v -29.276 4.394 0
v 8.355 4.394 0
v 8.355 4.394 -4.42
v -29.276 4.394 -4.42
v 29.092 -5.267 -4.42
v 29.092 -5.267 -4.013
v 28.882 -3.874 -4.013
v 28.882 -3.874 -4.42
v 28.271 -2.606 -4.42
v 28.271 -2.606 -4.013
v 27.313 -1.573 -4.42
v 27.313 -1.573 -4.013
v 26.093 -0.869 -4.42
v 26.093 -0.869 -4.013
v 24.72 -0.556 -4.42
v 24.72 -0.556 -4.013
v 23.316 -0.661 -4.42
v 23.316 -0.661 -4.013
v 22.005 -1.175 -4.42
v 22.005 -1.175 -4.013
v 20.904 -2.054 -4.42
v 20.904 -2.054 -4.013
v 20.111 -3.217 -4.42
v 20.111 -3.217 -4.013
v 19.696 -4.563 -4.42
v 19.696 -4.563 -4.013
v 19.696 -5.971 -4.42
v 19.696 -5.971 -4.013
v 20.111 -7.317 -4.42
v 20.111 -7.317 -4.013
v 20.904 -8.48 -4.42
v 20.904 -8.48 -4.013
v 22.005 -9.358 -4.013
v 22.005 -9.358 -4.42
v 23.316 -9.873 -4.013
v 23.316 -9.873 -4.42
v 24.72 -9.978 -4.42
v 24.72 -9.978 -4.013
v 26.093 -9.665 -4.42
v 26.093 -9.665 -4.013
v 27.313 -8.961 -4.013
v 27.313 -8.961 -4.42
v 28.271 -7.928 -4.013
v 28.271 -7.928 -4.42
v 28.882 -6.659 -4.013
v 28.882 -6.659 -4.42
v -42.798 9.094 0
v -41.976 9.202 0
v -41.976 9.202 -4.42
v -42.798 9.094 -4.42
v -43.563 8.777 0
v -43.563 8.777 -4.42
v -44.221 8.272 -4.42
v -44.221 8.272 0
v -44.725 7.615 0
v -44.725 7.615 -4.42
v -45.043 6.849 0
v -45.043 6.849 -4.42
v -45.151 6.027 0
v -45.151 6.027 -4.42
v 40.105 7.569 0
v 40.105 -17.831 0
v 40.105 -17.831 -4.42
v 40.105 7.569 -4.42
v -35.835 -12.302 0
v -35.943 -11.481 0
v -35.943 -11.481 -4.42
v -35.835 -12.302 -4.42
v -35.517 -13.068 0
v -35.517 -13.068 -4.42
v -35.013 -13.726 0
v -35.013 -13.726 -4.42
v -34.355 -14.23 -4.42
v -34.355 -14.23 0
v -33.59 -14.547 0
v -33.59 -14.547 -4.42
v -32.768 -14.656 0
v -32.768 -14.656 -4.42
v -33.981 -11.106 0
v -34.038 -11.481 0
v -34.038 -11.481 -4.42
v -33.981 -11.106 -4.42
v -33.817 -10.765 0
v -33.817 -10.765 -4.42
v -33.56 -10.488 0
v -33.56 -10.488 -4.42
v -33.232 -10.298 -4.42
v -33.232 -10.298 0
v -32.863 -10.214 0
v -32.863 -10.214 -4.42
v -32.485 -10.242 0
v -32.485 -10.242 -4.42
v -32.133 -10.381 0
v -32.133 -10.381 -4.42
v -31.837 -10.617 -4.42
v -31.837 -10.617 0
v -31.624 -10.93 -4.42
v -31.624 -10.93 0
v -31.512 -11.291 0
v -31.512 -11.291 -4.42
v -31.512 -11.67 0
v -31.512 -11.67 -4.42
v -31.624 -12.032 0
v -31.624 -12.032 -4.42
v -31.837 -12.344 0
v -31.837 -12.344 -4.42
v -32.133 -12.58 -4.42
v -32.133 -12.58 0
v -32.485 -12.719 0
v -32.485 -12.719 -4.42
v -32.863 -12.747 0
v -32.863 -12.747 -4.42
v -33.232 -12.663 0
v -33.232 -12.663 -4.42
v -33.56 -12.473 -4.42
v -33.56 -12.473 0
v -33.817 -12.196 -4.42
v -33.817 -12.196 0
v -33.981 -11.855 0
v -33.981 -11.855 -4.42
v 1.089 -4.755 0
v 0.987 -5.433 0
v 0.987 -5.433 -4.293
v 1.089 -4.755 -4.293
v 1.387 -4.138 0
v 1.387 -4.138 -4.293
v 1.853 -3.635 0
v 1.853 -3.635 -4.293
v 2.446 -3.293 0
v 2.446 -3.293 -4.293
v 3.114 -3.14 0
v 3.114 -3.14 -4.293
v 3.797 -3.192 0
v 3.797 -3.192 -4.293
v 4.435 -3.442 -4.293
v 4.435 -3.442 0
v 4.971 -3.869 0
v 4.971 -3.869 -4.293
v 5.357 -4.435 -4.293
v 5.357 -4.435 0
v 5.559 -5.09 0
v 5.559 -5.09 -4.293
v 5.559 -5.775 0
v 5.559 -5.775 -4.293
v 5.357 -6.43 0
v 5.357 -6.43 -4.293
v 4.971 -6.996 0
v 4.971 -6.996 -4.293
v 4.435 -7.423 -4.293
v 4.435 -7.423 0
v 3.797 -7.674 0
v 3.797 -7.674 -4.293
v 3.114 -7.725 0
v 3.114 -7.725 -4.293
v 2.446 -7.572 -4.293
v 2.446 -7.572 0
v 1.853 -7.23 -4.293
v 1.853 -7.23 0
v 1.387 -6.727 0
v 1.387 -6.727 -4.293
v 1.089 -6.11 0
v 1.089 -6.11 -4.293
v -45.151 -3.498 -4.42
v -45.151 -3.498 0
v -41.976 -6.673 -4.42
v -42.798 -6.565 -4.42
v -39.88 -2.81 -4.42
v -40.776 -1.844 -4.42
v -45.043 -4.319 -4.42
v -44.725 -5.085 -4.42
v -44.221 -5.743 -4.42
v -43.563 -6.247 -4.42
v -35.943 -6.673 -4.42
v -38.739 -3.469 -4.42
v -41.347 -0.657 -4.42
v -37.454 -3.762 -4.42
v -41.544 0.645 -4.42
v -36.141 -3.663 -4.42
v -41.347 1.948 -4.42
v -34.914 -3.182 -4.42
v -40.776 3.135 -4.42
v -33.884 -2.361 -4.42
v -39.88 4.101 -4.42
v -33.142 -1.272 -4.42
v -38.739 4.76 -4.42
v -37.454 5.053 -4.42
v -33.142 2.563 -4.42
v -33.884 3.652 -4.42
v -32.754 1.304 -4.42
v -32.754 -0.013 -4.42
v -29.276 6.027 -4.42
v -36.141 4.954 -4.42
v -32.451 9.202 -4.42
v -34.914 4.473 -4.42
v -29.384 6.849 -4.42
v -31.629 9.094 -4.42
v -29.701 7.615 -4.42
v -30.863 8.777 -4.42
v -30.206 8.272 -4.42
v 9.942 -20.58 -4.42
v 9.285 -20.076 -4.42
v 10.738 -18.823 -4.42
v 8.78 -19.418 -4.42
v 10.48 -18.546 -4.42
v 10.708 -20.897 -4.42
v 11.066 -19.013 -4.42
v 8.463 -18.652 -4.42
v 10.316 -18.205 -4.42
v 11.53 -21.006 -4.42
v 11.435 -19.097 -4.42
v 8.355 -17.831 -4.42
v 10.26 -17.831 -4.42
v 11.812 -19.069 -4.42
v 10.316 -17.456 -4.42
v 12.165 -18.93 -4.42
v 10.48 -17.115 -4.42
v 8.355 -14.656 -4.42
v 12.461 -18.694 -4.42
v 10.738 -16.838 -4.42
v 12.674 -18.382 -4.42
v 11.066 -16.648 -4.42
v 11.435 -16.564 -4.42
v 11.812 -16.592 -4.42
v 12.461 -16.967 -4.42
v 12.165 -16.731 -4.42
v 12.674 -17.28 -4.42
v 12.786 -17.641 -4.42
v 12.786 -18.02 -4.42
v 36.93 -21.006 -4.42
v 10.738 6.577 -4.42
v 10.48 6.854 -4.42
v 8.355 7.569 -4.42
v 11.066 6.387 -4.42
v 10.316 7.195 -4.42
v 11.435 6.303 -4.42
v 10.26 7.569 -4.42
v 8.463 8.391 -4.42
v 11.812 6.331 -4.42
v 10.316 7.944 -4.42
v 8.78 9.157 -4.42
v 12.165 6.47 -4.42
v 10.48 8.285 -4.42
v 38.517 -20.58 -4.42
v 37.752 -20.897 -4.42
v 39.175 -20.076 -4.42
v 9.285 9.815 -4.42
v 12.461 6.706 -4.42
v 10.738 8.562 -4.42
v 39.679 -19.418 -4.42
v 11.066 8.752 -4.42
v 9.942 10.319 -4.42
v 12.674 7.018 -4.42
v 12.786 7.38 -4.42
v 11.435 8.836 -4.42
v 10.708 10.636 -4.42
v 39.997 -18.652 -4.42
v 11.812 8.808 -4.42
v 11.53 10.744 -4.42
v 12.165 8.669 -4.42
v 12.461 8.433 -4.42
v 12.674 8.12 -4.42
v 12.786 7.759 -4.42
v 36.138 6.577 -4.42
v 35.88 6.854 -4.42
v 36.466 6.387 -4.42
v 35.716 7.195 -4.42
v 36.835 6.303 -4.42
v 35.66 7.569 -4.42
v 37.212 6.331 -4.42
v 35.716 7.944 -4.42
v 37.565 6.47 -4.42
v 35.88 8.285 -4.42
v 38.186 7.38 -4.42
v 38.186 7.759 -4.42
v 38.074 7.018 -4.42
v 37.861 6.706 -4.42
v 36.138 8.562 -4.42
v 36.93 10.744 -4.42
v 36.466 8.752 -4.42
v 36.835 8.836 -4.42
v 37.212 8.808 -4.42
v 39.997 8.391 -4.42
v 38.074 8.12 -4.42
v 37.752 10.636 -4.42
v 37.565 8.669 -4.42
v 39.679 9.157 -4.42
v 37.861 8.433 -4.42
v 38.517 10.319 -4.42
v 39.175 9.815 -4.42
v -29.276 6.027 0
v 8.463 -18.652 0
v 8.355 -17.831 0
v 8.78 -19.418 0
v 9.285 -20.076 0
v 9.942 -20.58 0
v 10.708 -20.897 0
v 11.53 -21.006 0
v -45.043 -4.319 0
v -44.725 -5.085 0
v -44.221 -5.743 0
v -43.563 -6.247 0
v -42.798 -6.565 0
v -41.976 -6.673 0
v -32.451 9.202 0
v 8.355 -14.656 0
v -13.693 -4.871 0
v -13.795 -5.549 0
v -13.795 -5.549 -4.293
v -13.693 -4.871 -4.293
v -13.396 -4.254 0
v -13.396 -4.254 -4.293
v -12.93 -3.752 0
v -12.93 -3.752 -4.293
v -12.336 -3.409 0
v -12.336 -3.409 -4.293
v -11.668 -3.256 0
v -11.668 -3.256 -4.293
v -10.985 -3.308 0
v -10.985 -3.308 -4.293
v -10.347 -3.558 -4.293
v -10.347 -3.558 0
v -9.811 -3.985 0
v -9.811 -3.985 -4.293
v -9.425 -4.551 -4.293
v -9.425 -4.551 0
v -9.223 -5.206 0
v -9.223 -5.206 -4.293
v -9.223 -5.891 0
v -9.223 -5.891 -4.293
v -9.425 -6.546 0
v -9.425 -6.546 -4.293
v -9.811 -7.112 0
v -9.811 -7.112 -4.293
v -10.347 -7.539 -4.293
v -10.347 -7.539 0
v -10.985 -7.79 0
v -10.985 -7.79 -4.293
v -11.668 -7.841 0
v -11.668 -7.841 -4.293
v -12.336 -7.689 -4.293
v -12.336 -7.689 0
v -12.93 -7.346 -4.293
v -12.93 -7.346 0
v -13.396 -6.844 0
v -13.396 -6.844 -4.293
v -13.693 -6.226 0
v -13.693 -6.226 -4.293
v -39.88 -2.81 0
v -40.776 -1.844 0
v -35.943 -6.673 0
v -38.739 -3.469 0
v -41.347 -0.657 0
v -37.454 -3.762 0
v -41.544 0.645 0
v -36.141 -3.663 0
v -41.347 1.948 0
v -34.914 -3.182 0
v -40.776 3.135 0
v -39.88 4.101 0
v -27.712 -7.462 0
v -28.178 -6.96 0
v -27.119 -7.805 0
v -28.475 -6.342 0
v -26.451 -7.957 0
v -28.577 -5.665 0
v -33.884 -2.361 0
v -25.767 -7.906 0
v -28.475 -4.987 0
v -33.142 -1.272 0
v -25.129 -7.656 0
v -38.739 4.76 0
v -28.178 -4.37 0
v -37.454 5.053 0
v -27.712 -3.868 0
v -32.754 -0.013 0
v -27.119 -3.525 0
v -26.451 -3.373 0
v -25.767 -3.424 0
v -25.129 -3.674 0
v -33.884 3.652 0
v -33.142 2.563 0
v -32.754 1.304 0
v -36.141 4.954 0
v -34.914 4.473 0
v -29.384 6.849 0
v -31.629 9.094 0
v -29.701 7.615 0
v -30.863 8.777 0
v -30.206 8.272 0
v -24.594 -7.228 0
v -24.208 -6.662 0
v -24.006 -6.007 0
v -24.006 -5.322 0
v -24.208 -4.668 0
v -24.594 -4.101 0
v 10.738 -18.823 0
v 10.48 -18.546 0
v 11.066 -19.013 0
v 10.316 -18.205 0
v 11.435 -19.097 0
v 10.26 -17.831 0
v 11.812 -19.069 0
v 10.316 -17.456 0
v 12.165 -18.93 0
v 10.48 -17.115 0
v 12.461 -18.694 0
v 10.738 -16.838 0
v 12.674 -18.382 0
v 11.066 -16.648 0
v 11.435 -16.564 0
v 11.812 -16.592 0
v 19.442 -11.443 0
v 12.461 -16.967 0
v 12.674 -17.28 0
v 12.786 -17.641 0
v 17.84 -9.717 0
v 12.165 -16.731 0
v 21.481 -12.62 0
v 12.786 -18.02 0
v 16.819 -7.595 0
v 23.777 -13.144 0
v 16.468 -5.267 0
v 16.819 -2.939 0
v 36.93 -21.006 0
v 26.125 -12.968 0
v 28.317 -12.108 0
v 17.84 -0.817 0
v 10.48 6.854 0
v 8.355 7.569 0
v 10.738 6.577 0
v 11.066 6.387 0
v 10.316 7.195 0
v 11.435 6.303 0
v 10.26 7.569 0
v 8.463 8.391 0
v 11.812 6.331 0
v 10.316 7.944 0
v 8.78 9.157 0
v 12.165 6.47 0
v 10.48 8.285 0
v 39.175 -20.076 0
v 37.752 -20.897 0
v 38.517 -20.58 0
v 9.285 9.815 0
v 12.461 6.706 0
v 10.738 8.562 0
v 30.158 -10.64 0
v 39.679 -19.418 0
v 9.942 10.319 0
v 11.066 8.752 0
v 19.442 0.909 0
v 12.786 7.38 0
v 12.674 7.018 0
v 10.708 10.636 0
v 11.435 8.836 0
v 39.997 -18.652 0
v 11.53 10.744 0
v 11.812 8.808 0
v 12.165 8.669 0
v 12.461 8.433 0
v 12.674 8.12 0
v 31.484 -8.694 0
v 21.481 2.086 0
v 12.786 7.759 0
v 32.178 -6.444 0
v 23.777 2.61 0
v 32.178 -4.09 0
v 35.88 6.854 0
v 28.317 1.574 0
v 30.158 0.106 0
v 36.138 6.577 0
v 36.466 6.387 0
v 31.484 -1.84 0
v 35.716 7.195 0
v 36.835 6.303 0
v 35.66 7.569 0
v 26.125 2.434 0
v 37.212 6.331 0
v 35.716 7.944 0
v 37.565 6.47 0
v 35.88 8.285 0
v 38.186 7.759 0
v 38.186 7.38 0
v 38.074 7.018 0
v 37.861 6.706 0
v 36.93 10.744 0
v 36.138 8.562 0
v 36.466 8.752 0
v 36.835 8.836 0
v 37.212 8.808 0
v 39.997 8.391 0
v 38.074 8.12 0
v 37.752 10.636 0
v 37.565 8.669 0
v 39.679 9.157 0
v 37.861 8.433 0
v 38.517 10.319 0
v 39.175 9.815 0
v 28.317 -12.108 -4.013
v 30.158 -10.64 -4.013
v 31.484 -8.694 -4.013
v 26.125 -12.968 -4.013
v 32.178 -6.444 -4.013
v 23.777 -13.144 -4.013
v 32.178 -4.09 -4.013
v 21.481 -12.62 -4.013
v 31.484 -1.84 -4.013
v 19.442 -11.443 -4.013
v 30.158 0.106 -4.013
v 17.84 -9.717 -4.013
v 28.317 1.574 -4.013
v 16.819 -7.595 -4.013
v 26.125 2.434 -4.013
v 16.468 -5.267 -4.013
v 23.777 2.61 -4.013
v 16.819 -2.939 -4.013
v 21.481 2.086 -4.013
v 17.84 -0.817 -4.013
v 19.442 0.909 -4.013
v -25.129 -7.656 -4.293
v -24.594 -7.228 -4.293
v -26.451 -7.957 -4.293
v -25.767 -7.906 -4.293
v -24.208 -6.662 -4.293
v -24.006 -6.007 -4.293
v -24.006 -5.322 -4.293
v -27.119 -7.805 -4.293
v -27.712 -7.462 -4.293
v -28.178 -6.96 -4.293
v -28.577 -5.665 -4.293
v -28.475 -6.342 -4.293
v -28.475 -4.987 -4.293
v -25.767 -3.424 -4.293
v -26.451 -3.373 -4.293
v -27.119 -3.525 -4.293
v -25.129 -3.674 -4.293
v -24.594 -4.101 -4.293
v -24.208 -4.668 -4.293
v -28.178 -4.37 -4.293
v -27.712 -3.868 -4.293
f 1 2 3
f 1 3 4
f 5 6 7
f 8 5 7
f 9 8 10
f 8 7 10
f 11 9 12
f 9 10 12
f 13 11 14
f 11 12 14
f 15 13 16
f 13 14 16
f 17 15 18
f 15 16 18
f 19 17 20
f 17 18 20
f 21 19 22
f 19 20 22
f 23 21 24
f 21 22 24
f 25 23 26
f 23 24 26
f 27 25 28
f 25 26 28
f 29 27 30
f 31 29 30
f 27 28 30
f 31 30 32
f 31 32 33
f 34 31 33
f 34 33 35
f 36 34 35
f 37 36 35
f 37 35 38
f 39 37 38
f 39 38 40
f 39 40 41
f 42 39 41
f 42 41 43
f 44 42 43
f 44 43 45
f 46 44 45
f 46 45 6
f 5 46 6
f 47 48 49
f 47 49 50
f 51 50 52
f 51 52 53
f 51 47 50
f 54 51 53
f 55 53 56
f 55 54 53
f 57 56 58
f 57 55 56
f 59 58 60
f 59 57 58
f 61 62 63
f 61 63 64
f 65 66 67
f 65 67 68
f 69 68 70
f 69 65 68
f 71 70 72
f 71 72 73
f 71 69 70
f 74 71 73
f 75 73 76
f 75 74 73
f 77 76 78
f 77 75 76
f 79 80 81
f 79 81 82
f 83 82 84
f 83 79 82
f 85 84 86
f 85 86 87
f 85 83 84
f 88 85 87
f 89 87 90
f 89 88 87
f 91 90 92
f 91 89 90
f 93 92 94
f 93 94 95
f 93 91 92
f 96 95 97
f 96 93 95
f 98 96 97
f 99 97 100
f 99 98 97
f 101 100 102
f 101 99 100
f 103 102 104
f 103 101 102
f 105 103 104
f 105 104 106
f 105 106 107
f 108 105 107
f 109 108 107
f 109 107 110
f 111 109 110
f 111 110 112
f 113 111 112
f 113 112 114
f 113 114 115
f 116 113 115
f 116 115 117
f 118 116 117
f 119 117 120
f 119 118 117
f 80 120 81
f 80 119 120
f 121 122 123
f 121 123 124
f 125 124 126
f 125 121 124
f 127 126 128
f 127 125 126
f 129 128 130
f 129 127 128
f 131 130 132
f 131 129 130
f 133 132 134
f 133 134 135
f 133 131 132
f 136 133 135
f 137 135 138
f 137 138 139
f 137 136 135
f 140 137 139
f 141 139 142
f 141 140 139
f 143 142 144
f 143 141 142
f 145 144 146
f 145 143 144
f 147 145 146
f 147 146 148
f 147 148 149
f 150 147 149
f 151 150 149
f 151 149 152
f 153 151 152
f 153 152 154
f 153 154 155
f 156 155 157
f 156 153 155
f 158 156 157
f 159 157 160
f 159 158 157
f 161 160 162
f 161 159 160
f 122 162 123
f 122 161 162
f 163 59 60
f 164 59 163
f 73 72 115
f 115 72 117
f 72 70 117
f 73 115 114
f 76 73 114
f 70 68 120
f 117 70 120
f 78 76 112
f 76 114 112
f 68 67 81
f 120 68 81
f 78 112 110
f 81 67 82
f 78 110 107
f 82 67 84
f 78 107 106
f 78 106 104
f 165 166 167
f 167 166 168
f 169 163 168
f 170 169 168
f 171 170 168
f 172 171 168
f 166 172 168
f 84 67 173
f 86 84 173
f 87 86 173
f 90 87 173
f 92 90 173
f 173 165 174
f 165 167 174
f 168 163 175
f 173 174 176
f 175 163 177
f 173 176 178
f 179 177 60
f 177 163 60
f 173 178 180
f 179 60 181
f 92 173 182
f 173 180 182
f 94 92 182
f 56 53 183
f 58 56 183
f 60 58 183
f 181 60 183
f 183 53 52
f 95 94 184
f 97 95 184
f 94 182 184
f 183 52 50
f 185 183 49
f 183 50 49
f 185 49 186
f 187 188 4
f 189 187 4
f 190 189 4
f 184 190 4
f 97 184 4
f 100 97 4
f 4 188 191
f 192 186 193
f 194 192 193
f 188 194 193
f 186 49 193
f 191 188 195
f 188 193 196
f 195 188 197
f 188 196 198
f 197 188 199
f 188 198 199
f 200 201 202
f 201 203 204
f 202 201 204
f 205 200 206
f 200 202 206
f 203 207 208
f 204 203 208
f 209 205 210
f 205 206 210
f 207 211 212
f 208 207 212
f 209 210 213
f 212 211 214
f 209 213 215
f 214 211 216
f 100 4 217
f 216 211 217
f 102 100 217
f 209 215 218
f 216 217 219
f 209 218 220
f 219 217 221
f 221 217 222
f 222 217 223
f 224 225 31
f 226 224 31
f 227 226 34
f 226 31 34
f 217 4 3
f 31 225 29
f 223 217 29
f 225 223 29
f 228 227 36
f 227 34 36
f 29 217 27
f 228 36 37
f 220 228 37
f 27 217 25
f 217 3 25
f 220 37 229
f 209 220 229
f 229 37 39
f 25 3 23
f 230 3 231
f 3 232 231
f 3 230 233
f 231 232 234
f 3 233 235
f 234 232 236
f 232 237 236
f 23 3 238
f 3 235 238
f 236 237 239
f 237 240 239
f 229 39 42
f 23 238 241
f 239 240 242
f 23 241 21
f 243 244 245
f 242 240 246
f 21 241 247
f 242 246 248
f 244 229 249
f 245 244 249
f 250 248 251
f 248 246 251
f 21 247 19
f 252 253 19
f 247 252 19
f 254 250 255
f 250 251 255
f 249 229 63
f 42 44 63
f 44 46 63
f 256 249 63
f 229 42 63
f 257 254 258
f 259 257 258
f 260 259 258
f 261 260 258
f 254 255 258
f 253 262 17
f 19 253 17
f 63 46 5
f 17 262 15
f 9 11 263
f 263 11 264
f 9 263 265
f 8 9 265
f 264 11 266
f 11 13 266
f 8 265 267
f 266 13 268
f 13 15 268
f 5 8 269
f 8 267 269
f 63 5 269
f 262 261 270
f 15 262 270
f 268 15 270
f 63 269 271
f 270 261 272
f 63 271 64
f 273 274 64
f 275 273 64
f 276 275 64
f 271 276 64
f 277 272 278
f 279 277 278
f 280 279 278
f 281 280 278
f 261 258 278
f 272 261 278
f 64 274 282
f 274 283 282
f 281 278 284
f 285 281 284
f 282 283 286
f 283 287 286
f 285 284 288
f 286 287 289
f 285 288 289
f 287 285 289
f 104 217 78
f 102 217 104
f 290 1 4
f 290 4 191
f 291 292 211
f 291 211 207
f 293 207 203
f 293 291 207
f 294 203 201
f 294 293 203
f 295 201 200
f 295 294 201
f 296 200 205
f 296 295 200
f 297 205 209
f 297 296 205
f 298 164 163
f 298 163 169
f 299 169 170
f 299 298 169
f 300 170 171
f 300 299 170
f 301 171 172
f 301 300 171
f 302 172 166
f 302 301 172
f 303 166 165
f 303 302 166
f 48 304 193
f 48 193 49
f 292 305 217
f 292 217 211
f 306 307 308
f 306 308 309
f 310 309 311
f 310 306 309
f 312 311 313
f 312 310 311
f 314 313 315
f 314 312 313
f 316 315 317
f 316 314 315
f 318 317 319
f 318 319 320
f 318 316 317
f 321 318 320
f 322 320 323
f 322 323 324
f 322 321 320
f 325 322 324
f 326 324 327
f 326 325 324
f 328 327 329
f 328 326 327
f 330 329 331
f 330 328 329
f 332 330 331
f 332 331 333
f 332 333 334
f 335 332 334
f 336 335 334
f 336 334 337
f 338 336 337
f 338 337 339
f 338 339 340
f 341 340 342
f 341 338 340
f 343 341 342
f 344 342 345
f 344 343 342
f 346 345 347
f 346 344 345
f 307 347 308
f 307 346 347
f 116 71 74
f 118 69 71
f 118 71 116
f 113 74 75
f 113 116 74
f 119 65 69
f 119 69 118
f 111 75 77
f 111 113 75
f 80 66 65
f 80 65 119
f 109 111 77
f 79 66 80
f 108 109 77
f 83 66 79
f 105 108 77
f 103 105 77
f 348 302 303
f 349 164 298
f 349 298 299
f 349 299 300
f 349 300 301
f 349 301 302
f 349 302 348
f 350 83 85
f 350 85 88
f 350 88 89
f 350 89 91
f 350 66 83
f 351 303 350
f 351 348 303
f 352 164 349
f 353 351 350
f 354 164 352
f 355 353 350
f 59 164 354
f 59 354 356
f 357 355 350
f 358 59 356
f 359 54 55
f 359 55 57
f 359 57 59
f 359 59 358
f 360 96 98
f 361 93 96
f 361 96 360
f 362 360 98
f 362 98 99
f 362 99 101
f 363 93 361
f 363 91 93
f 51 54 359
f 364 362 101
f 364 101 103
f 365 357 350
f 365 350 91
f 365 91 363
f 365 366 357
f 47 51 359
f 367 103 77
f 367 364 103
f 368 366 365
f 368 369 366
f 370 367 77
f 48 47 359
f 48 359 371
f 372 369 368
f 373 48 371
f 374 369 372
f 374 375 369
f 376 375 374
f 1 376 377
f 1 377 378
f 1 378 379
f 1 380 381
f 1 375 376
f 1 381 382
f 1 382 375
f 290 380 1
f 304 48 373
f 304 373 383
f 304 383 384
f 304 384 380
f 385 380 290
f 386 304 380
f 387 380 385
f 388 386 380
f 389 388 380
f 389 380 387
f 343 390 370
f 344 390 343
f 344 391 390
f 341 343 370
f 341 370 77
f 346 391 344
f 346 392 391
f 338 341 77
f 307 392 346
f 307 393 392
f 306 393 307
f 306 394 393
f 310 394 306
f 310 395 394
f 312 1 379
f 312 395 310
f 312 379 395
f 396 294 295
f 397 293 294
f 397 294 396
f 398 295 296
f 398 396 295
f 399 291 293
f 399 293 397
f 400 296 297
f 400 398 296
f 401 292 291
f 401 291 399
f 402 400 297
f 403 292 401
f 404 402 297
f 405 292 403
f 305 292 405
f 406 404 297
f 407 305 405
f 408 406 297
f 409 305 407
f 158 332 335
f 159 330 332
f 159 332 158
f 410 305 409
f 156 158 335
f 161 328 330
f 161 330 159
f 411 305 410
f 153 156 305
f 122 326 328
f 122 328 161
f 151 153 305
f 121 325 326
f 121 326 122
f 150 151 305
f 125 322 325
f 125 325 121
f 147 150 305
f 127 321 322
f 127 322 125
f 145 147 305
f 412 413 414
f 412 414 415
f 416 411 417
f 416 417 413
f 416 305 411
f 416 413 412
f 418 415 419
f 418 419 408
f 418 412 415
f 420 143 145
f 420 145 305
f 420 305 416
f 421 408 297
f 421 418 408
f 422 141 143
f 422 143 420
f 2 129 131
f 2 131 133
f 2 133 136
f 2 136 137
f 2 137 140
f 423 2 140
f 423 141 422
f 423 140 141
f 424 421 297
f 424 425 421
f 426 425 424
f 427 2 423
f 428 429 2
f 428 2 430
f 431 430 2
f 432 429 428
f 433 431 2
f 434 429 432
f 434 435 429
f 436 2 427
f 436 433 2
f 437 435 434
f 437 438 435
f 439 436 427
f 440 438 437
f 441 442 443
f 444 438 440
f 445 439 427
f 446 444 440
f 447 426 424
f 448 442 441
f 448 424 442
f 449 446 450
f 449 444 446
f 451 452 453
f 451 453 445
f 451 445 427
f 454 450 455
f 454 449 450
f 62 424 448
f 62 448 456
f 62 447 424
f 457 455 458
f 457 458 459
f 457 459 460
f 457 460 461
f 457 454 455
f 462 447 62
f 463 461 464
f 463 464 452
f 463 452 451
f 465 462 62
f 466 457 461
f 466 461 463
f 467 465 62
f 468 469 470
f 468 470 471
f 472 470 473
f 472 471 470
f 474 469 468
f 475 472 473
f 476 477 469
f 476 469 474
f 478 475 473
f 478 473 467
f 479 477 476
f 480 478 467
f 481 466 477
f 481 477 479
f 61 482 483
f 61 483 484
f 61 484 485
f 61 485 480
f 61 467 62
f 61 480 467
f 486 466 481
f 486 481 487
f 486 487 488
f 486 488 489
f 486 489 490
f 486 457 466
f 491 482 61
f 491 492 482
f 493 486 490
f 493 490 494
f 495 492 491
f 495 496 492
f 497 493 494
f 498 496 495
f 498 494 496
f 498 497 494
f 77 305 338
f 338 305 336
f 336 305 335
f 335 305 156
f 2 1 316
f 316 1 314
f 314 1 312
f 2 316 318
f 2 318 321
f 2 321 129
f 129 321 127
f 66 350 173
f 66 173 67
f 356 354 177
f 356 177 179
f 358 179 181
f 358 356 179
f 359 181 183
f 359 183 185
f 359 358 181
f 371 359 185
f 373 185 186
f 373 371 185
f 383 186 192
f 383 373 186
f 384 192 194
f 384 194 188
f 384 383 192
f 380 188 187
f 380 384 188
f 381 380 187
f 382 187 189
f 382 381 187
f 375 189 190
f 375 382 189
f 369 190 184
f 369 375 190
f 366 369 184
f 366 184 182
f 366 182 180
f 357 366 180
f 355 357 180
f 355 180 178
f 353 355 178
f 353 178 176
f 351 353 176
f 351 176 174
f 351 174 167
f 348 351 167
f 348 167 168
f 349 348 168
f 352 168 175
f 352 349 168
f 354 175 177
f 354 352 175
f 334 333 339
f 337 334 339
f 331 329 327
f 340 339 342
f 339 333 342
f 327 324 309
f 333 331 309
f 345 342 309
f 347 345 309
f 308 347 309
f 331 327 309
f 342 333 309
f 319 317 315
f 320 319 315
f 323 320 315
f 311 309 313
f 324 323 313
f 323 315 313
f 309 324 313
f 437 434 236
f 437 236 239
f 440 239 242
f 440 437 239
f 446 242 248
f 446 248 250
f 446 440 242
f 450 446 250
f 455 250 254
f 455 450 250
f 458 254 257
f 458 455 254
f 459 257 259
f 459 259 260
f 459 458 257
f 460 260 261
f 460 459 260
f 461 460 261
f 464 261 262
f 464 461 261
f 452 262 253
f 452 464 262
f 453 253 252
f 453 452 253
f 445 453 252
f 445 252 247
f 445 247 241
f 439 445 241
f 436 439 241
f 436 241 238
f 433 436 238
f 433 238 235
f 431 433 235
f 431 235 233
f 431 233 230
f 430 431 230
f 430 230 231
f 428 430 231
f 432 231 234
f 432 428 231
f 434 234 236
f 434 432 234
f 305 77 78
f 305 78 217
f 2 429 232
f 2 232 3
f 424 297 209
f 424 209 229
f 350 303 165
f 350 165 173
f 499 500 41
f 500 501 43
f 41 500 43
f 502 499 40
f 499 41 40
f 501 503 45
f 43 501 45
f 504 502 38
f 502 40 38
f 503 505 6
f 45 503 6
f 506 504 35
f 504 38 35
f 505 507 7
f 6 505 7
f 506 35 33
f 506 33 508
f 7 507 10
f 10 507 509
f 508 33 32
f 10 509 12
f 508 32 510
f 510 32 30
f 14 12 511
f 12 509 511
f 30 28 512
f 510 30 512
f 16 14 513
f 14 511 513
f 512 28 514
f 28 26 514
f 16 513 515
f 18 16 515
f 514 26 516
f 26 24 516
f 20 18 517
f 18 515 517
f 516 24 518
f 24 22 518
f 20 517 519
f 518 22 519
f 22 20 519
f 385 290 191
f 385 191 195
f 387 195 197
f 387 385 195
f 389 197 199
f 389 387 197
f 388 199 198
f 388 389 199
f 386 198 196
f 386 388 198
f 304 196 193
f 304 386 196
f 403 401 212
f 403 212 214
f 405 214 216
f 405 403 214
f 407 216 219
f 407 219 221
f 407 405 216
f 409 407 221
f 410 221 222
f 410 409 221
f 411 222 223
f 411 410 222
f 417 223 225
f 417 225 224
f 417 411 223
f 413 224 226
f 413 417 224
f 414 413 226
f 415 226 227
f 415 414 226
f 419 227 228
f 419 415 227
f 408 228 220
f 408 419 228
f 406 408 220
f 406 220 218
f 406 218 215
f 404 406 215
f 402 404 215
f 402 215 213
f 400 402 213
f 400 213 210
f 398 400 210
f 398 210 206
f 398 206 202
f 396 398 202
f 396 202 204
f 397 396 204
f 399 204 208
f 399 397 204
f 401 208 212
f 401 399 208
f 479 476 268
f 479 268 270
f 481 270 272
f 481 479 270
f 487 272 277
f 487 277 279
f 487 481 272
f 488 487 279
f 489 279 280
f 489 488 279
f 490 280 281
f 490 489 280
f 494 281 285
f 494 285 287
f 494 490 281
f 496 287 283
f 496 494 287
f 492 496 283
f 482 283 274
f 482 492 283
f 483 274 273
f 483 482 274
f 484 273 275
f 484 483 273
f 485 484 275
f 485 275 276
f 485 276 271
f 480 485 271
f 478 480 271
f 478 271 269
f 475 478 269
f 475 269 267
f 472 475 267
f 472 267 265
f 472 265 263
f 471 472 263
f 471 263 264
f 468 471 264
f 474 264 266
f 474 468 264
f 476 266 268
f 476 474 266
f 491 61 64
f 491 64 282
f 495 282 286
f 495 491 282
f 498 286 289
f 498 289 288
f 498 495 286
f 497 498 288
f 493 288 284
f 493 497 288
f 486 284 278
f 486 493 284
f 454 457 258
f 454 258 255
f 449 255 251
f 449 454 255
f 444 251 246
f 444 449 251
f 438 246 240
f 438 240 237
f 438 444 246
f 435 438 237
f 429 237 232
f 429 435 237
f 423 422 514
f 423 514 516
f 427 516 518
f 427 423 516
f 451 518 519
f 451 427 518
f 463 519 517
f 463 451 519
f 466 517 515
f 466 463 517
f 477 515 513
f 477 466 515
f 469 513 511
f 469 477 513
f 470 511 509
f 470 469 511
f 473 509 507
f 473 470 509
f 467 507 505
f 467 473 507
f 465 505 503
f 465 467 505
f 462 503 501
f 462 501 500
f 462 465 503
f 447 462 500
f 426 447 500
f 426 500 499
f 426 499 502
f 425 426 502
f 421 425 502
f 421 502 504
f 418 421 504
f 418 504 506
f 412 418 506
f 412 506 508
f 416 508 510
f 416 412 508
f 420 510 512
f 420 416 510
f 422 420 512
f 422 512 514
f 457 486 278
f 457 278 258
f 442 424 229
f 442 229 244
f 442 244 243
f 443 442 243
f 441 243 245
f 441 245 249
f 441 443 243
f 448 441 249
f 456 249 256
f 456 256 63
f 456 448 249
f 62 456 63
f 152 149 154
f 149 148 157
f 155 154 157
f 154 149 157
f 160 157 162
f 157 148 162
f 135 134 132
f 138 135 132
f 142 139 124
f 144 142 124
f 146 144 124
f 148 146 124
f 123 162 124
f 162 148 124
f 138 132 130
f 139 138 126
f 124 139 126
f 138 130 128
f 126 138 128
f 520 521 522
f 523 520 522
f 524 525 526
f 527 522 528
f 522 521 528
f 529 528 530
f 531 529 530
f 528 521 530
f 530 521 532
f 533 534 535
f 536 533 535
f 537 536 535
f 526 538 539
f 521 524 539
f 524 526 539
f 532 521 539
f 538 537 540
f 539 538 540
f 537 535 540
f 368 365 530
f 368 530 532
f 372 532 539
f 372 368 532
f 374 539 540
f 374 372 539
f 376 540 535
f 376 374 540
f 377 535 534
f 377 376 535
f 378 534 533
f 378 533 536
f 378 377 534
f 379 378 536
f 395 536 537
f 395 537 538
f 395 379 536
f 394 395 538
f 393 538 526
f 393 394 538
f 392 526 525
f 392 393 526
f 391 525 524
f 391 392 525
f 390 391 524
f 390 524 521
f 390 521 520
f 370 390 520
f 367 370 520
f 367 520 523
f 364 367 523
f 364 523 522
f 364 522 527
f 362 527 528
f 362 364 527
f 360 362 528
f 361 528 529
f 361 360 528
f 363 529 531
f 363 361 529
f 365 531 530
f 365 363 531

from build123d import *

# Parameters (mm, degrees)
SKETCH4_R                = 4.7244
STOCK_DEPTH              = 4.4196
SKETCH7_R                = 7.8994
CV_GEAR_WELL_DEPTH       = 4.0132
SKETCH8_R                = 2.2987
IDLER_GEAR_WELL_DEPTH    = 4.2926
SKETCH9_R                = 1.27
SKETCH9_R_2              = 4.4196
OUTDRIVE_GEAR_WELL_DEPTH = 4.4196


with BuildPart() as part:
    # Sketch4 → Stock (new body)
    with BuildSketch(Plane.XY):
        with BuildLine():
            Line((-32.450767839, 9.202272933), (-41.975767839, 9.202272933))
            ThreePointArc((-41.975767839, 9.202272933), (-44.220831869, 8.272336964), (-45.150767839, 6.027272933))
            Line((-45.150767839, 6.027272933), (-45.150767839, -3.497727067))
            ThreePointArc((-45.150767839, -3.497727067), (-44.220831869, -5.742791097), (-41.975767839, -6.672727067))
            Line((-41.975767839, -6.672727067), (-35.942804696, -6.672727067))
            Line((-35.942804696, -6.672727067), (-35.942804696, -11.480556714))
            ThreePointArc((-35.942804696, -11.480556714), (-35.012868726, -13.725620744), (-32.767804696, -14.655556714))
            Line((-32.767804696, -14.655556714), (8.354795304, -14.655556714))
            Line((8.354795304, -14.655556714), (8.354795304, -17.830556714))
            ThreePointArc((8.354795304, -17.830556714), (9.284731274, -20.075620744), (11.529795304, -21.005556714))
            Line((11.529795304, -21.005556714), (36.929795304, -21.005556714))
            ThreePointArc((36.929795304, -21.005556714), (39.174859334, -20.075620744), (40.104795304, -17.830556714))
            Line((40.104795304, -17.830556714), (40.104795304, 7.569443286))
            ThreePointArc((40.104795304, 7.569443286), (39.174859334, 9.814507317), (36.929795304, 10.744443286))
            Line((36.929795304, 10.744443286), (11.529795304, 10.744443286))
            ThreePointArc((11.529795304, 10.744443286), (9.284731274, 9.814507317), (8.354795304, 7.569443286))
            Line((8.354795304, 7.569443286), (8.354795304, 4.394443286))
            Line((8.354795304, 4.394443286), (-29.275767839, 4.394443286))
            Line((-29.275767839, 4.394443286), (-29.275767839, 6.027272933))
            ThreePointArc((-29.275767839, 6.027272933), (-30.205703809, 8.272336964), (-32.450767839, 9.202272933))
        make_face()
        with Locations((24.367264728, -5.266950247)):
            Circle(SKETCH4_R, mode=Mode.SUBTRACT)
    extrude(amount=-STOCK_DEPTH)

    # Sketch7 → CV Gear Well (cut)
    with BuildSketch(Plane(origin=(0, 0, 0), x_dir=(-1, 0, 0), z_dir=(0, 0, -1))):
        with Locations((-24.367264728, -5.266950247)):
            Circle(SKETCH7_R)
    extrude(amount=CV_GEAR_WELL_DEPTH, mode=Mode.SUBTRACT)

    # Sketch8 → Idler Gear Well (cut)
    with BuildSketch(Plane(origin=(0, 0, 0), x_dir=(-1, 0, 0), z_dir=(0, 0, -1))):
        with Locations((26.278771935, -5.664889979)):
            Circle(SKETCH8_R)
        with Locations((11.496428235, -5.54874107)):
            Circle(SKETCH8_R)
        with Locations((-3.285915465, -5.432592161)):
            Circle(SKETCH8_R)
    extrude(amount=IDLER_GEAR_WELL_DEPTH, mode=Mode.SUBTRACT)

    # Sketch9 → Outdrive Gear Well (cut)
    with BuildSketch(Plane(origin=(0, 0, 0), x_dir=(-1, 0, 0), z_dir=(0, 0, -1))):
        with Locations((32.767804696, -11.480556714)):
            Circle(SKETCH9_R)
        with Locations((-11.529795304, -17.830556714)):
            Circle(SKETCH9_R)
        with Locations((-11.529795304, 7.569443286)):
            Circle(SKETCH9_R)
        with Locations((-36.929795304, 7.569443286)):
            Circle(SKETCH9_R)
        with Locations((37.124150155, 0.645421982)):
            Circle(SKETCH9_R_2)
    extrude(amount=OUTDRIVE_GEAR_WELL_DEPTH, mode=Mode.SUBTRACT)


solid = part.part
